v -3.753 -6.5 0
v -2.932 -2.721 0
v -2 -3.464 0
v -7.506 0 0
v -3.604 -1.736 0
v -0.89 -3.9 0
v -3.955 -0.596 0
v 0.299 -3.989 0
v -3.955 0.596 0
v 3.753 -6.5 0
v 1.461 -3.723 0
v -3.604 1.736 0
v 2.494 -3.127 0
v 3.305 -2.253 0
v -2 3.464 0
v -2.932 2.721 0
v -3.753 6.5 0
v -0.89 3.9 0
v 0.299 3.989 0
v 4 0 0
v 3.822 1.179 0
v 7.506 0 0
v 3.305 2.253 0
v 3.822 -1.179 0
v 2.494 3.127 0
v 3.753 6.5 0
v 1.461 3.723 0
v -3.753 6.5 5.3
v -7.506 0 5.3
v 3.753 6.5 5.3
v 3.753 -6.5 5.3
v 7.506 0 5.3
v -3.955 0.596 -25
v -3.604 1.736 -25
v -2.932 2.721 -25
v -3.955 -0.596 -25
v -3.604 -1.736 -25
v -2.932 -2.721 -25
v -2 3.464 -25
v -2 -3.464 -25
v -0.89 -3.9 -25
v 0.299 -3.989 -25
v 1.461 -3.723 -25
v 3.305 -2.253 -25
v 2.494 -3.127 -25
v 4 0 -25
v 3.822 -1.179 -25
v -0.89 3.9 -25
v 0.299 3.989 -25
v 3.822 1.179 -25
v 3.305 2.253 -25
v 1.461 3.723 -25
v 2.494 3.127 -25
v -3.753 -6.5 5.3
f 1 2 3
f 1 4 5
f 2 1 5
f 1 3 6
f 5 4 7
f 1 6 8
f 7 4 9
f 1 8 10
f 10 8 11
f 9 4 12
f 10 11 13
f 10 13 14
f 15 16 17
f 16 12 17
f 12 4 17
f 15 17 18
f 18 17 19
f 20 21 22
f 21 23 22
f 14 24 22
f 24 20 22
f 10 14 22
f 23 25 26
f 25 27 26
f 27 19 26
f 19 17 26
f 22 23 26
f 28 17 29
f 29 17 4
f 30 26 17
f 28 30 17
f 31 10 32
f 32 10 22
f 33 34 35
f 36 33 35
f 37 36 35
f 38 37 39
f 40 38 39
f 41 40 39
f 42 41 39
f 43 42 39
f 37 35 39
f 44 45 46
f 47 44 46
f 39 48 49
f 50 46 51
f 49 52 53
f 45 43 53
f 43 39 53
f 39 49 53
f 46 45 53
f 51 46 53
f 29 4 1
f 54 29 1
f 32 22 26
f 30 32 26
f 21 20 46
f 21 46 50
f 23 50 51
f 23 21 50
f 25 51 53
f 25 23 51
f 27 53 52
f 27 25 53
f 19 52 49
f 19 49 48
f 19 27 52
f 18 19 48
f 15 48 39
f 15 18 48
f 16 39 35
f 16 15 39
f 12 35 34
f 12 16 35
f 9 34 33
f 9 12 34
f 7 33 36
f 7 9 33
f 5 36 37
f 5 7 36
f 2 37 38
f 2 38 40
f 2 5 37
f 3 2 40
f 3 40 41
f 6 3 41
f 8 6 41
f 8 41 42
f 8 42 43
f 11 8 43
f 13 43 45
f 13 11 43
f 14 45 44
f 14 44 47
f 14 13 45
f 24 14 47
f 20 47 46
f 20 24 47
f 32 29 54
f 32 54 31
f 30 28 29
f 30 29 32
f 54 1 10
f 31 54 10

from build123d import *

# Parameters (mm, degrees)
SKETCH1_R      = 4
EXTRUDE1_DEPTH = 25
EXTRUDE2_DEPTH = 5.3


with BuildPart() as part:
    # Sketch1 → Extrude1 (new body)
    with BuildSketch(Plane.XY):
        Circle(SKETCH1_R)
    extrude(amount=-EXTRUDE1_DEPTH)

    # Sketch2 → Extrude2 (add)
    with BuildSketch(Plane.XY):
        Polygon((-3.75277675, 6.5), (-7.505553499, 0), (-3.75277675, -6.5), (3.75277675, -6.5), (7.505553499, 0), (3.75277675, 6.5), align=None)
    extrude(amount=EXTRUDE2_DEPTH)


solid = part.part
